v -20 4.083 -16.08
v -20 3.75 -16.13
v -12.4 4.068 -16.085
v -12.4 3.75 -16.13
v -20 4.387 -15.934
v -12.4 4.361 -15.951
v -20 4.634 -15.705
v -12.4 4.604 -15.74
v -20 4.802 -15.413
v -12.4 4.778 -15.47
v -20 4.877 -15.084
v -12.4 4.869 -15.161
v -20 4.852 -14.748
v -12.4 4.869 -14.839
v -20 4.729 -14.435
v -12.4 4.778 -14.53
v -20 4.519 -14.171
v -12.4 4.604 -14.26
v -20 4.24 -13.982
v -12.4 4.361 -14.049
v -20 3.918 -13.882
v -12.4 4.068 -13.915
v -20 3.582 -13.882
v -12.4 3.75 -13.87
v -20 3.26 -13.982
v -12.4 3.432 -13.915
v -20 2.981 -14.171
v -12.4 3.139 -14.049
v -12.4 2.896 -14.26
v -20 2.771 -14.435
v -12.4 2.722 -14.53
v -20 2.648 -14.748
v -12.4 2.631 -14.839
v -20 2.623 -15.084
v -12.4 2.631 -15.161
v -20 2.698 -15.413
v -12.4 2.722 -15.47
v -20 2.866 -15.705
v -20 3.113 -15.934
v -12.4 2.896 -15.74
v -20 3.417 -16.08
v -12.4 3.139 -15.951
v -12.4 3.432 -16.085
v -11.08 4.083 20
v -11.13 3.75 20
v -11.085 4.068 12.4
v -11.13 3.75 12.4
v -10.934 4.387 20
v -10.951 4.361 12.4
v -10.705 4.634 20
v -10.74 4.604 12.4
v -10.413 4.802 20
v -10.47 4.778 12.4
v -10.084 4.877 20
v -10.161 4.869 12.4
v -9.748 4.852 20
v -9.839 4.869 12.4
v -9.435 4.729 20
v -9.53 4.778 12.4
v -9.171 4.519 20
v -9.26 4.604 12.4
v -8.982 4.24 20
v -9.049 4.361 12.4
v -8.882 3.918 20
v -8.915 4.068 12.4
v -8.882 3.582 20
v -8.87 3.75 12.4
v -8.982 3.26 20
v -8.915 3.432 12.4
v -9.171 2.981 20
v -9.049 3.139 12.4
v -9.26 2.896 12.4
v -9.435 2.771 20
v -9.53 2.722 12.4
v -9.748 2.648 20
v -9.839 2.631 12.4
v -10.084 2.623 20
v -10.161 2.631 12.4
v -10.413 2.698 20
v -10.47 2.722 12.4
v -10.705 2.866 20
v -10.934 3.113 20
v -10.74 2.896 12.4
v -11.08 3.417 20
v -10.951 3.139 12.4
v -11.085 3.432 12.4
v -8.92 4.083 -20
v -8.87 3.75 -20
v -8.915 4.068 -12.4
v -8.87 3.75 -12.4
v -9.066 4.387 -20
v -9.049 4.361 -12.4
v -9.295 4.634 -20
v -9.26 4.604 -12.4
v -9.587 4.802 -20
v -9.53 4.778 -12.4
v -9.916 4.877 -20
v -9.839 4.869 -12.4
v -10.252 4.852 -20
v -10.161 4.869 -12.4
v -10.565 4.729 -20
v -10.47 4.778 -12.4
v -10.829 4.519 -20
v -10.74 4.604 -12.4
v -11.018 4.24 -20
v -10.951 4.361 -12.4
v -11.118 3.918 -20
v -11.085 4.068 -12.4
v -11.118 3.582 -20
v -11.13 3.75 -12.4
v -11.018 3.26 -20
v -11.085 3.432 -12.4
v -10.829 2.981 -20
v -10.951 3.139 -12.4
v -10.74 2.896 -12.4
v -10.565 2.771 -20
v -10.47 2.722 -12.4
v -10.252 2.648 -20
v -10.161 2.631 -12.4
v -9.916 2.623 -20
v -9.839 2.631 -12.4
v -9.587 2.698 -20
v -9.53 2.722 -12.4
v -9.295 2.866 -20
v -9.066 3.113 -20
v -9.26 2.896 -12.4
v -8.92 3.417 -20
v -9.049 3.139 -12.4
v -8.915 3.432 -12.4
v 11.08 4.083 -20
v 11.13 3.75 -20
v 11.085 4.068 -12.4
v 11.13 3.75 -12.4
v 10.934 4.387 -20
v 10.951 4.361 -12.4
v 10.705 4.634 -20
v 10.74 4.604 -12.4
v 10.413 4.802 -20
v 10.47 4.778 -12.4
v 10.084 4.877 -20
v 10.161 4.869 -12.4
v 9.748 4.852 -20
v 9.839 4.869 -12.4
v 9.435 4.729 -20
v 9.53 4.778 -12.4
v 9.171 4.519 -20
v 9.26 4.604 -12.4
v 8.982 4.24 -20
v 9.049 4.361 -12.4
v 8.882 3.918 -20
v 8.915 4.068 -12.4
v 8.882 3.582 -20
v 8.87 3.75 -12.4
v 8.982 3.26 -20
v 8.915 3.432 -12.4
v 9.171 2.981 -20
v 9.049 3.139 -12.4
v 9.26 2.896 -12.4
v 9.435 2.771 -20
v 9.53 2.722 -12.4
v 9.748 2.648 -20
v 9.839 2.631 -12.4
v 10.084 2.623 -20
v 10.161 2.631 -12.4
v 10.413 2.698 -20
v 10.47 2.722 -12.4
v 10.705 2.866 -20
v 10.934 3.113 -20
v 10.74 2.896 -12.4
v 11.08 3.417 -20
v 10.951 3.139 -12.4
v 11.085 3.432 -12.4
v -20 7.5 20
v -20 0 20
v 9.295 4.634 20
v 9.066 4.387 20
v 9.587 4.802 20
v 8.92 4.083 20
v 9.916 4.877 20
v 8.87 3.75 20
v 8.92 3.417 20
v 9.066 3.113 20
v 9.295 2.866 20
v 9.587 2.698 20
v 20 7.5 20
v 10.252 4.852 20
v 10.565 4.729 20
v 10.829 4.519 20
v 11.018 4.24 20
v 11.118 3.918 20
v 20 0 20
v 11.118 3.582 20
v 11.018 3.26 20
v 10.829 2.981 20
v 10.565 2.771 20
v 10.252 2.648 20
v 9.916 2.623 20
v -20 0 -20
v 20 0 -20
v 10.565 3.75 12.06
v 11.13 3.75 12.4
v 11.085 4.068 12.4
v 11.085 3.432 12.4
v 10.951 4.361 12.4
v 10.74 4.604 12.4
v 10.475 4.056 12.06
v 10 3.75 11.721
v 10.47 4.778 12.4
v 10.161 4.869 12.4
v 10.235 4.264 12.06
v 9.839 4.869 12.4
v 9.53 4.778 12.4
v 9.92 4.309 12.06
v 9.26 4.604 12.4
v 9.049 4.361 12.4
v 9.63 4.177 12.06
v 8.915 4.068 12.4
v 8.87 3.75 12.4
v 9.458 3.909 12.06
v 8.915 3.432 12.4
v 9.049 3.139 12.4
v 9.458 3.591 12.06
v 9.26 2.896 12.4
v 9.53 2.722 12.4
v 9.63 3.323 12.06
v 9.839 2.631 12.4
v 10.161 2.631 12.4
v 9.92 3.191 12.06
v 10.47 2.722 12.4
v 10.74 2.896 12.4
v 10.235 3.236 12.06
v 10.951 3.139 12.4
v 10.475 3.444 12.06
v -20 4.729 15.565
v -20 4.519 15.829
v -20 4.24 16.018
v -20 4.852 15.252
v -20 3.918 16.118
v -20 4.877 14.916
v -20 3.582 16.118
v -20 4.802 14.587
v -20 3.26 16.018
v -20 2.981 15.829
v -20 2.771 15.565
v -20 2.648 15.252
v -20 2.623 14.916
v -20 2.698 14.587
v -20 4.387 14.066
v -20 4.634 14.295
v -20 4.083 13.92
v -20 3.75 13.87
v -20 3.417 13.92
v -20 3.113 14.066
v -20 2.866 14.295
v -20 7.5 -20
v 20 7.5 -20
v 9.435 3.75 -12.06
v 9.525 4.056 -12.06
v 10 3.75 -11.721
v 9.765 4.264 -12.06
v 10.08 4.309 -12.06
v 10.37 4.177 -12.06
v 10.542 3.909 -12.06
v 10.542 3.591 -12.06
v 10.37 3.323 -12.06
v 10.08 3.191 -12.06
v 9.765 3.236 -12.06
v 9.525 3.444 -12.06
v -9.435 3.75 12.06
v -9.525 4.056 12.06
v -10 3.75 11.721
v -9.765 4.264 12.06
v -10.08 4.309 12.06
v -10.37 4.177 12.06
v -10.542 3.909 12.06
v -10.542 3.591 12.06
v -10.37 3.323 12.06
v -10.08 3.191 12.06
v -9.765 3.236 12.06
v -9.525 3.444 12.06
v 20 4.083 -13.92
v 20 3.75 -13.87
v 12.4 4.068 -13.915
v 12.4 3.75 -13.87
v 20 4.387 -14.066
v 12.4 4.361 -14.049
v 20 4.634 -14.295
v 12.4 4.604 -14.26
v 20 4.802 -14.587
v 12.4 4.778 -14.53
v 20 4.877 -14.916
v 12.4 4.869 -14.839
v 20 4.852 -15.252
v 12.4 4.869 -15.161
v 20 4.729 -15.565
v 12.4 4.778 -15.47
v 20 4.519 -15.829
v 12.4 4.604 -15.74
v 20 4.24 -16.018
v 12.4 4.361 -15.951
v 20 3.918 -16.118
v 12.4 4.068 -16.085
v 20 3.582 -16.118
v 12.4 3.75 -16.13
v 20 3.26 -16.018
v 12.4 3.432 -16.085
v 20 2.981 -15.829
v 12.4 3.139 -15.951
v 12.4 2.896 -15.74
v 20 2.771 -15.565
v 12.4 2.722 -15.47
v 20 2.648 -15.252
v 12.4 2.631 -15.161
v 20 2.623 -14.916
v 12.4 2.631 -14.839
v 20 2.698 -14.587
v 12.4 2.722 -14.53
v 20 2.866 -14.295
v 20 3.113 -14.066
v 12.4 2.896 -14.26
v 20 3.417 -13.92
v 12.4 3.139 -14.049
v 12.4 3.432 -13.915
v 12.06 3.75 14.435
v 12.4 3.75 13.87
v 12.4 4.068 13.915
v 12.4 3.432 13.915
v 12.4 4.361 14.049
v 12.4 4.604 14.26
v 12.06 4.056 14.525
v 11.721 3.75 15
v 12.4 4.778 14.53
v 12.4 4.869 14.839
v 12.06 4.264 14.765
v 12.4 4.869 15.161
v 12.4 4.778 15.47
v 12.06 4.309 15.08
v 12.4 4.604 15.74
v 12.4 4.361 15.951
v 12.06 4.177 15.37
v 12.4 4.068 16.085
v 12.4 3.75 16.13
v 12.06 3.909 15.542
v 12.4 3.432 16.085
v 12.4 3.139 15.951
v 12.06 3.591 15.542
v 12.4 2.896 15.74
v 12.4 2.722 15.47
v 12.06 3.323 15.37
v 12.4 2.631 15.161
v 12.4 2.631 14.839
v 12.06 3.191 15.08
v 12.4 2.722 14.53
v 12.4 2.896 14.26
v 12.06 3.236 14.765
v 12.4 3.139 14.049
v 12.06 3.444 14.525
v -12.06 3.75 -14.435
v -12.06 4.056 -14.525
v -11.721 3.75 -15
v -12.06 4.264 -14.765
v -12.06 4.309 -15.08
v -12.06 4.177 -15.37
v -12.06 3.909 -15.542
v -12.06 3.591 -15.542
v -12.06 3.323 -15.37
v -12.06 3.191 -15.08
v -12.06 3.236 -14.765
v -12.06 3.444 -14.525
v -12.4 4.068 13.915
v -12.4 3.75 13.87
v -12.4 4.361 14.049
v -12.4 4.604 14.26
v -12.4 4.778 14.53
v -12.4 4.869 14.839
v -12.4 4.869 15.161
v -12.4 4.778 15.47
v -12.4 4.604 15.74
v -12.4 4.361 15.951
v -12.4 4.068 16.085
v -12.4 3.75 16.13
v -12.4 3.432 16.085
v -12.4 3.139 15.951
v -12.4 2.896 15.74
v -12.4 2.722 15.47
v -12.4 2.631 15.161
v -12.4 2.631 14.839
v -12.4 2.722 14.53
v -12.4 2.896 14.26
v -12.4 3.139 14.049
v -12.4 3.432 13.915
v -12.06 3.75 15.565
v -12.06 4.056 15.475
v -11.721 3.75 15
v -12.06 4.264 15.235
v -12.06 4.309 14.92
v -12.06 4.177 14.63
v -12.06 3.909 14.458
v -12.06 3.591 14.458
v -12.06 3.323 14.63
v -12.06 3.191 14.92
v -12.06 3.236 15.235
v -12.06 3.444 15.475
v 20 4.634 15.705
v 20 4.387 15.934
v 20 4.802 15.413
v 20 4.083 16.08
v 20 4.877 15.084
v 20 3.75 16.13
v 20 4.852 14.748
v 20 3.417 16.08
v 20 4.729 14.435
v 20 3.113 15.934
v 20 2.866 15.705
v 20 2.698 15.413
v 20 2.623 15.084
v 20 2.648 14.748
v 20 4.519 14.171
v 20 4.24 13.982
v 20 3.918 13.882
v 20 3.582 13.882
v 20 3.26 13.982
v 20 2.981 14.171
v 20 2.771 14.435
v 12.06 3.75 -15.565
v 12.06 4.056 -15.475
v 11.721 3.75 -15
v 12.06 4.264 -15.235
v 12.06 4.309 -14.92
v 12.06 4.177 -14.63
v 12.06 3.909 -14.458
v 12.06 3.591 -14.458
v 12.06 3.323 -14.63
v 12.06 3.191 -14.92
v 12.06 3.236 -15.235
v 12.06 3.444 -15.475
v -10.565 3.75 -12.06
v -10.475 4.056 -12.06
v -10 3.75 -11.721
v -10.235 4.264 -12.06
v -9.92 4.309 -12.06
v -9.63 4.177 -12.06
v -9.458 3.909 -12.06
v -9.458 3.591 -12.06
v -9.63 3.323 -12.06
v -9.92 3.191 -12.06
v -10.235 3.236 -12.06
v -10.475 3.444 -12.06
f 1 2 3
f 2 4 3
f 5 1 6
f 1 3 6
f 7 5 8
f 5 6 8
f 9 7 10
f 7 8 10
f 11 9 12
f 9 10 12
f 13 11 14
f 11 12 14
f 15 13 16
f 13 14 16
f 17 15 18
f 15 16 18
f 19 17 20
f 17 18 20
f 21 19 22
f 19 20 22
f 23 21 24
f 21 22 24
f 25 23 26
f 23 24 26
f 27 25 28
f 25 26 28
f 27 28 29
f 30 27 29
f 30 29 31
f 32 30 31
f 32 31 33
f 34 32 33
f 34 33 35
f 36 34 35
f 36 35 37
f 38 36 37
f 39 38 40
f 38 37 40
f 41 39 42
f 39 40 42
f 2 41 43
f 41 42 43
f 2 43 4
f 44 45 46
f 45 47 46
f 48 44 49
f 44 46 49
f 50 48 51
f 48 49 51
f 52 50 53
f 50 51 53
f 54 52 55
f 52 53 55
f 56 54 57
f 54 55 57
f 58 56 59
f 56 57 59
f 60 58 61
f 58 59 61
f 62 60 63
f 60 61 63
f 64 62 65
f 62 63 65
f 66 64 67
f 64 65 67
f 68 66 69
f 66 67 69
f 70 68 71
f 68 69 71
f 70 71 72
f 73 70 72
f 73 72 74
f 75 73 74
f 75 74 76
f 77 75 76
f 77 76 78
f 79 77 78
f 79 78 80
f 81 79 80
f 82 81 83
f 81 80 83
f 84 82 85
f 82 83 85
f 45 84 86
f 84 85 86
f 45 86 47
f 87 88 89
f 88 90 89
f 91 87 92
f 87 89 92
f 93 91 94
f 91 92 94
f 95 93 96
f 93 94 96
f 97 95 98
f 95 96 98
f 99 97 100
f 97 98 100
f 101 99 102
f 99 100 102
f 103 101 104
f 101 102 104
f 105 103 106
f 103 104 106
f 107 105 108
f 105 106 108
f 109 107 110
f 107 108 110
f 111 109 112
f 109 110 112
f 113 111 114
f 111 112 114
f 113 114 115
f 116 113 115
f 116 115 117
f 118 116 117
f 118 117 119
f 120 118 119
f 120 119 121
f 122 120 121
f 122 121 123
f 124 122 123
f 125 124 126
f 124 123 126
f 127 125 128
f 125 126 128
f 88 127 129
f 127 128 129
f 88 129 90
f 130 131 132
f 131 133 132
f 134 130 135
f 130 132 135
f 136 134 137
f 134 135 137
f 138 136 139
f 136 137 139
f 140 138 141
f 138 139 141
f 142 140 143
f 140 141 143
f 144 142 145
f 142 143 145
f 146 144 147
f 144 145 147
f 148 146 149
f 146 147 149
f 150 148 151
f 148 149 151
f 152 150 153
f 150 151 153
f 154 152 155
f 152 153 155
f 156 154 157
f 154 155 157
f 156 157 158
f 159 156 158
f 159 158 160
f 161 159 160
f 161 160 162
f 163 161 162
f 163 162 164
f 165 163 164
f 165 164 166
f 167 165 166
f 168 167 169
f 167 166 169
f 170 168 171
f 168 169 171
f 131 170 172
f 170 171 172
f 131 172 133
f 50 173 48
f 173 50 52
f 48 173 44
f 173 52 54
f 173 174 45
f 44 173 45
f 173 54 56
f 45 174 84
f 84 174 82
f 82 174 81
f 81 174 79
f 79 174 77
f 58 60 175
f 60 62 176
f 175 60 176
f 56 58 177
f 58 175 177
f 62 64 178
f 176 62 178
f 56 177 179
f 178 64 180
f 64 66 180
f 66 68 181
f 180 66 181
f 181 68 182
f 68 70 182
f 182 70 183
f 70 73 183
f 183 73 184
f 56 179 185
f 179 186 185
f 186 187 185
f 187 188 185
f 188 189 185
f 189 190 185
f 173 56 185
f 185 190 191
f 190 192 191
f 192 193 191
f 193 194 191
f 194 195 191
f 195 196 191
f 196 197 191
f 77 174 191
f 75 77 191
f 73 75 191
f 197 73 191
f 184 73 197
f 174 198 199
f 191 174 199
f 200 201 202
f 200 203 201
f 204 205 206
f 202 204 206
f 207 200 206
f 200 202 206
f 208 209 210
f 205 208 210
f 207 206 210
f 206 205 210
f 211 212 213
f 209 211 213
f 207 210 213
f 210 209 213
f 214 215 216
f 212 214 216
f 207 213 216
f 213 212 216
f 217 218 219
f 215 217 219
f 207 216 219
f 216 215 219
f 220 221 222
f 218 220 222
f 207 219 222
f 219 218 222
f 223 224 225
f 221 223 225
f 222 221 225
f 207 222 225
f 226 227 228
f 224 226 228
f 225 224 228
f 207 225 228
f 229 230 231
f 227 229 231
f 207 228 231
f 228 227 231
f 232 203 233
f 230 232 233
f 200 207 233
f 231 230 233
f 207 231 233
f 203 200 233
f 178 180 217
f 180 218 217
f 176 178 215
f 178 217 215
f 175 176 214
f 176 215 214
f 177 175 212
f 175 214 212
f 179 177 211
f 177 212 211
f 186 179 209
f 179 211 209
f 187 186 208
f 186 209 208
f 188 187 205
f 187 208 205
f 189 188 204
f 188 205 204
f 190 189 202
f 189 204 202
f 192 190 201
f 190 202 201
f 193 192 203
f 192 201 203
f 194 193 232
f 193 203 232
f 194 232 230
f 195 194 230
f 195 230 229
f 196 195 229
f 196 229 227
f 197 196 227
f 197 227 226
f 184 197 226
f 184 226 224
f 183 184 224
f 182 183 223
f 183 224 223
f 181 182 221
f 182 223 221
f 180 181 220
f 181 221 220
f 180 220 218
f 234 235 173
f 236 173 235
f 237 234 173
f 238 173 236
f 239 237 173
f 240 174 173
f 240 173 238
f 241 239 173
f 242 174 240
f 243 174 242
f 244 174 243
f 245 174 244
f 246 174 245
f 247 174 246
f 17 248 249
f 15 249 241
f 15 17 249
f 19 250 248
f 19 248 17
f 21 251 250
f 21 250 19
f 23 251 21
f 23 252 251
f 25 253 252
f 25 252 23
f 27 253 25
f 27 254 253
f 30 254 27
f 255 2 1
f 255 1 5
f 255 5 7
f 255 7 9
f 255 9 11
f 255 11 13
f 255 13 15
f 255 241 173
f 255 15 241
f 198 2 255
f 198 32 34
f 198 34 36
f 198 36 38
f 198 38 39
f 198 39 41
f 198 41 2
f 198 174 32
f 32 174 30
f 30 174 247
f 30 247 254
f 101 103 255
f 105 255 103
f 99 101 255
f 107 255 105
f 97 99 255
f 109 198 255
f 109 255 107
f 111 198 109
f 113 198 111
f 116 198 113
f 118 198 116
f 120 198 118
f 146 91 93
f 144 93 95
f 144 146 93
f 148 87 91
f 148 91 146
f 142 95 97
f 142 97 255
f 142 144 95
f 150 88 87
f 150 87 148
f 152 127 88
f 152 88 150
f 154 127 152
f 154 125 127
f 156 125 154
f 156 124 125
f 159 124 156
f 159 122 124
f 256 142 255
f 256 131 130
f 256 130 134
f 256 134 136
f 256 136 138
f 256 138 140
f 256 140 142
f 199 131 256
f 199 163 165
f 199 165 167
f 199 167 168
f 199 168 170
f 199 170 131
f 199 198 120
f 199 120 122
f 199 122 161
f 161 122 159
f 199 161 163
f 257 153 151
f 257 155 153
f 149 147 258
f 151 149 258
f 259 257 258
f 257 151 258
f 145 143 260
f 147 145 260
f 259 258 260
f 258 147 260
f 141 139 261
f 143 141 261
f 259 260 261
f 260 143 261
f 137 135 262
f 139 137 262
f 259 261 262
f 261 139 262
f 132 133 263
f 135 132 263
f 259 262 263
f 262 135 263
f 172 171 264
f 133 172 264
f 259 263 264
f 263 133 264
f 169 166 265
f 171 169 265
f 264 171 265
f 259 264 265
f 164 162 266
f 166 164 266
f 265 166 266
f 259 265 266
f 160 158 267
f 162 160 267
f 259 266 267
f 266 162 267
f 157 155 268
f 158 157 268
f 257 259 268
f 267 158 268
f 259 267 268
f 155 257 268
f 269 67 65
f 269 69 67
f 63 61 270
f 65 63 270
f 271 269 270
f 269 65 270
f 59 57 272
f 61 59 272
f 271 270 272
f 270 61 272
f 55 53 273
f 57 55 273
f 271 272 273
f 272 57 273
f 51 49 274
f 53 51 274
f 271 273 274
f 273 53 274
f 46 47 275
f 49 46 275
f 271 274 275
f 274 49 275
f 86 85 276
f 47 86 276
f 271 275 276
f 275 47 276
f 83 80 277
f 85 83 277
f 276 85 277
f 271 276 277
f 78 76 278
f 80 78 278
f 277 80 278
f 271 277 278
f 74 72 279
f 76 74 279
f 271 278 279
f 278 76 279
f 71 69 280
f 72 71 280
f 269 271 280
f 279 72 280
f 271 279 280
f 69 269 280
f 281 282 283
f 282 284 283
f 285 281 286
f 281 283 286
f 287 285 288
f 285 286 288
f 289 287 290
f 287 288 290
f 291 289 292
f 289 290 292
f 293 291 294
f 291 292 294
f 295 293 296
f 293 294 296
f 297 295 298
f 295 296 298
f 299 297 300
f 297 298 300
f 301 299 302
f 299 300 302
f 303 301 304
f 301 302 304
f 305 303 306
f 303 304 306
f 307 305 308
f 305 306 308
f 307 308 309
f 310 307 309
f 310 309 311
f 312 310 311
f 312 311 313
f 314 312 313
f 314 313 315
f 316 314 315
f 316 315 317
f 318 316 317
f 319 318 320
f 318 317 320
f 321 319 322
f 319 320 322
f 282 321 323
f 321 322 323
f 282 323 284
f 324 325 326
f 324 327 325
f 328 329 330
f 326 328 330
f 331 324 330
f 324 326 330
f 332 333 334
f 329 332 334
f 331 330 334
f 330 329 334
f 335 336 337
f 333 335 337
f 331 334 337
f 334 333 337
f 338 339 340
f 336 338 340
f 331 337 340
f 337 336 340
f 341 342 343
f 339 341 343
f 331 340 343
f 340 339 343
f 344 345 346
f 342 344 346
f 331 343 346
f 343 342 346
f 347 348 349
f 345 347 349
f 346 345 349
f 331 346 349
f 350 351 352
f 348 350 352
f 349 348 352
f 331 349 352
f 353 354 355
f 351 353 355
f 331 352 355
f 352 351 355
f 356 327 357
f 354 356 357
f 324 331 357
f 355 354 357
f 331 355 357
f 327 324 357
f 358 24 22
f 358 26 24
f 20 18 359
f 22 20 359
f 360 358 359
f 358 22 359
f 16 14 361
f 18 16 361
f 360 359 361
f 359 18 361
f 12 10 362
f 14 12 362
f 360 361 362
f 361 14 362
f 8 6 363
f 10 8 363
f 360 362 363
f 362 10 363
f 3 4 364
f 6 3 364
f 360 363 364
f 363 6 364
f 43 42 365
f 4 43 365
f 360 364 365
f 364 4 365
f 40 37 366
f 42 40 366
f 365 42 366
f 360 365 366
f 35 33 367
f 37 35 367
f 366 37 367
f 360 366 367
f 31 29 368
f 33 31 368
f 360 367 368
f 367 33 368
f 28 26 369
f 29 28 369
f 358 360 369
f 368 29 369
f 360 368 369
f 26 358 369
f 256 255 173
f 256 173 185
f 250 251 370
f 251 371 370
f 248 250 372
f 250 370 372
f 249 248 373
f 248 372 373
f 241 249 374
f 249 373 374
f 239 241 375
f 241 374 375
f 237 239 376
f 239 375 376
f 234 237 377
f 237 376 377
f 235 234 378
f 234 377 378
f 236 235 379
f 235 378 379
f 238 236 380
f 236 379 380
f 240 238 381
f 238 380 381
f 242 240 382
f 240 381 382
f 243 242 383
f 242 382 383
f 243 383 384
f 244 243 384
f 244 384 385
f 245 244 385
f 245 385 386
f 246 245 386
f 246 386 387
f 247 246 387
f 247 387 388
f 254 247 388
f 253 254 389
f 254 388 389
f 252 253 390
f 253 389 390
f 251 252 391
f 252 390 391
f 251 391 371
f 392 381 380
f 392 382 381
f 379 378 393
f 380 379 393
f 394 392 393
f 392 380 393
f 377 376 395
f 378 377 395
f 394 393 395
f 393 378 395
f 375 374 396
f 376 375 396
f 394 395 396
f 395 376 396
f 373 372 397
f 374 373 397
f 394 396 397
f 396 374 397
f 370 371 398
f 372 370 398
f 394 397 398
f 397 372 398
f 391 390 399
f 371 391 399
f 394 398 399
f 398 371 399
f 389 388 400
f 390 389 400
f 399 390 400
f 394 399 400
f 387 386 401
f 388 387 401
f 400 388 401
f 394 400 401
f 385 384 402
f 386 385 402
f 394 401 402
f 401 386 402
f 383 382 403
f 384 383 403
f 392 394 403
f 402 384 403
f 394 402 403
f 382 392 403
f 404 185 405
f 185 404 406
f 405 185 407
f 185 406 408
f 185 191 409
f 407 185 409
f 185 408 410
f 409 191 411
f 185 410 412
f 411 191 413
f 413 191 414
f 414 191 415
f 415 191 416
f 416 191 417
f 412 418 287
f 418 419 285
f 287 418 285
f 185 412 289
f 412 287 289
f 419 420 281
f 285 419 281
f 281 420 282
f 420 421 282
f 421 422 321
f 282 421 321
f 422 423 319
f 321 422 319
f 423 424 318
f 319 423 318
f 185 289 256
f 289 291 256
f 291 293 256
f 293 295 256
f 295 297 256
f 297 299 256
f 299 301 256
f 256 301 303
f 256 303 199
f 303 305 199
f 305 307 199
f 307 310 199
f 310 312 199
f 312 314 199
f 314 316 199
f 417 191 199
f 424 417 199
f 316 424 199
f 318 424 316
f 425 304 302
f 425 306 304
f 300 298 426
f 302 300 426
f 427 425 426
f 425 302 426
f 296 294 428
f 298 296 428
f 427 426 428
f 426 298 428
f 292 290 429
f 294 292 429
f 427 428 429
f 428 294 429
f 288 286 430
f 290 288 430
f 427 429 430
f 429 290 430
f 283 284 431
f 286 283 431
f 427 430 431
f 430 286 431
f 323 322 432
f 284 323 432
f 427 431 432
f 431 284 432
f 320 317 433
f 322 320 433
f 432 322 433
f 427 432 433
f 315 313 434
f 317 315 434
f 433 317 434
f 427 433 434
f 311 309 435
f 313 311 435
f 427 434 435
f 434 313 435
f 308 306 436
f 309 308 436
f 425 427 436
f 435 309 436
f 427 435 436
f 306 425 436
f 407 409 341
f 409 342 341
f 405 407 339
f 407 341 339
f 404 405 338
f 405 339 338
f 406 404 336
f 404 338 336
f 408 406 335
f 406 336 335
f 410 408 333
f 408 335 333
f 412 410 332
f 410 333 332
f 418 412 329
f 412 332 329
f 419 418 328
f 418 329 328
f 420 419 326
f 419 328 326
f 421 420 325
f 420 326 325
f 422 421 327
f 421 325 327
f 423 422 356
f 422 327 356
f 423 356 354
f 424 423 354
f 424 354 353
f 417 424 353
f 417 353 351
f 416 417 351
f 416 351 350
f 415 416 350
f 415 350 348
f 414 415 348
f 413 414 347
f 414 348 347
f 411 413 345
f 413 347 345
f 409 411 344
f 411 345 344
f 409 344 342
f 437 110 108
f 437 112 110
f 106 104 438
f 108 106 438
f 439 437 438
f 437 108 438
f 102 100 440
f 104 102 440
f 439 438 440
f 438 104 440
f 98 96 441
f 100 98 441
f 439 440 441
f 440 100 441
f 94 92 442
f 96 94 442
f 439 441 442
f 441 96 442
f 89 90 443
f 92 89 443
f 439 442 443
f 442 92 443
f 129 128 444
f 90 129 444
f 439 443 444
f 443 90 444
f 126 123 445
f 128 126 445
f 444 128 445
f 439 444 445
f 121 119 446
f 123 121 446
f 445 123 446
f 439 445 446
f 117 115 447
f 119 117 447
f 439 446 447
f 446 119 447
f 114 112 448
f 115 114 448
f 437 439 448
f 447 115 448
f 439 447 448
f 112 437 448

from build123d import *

# Parameters (mm, degrees)
SKETCH1_W                 = 40
SKETCH1_H                 = 40
BOSS_EXTRUDE1_DEPTH       = 7.5
F_4_40_TAPPED_HOLE1_D     = 2.2606
F_4_40_TAPPED_HOLE1_DEPTH = 7.6
F_4_40_TAPPED_HOLE1_TIP   = 0.679152758
F_4_40_TAPPED_HOLE2_D     = 2.2606
F_4_40_TAPPED_HOLE2_DEPTH = 7.6
F_4_40_TAPPED_HOLE2_TIP   = 0.679152758
F_4_40_TAPPED_HOLE3_D     = 2.2606
F_4_40_TAPPED_HOLE3_DEPTH = 7.6
F_4_40_TAPPED_HOLE3_TIP   = 0.679152758
F_4_40_TAPPED_HOLE4_D     = 2.2606
F_4_40_TAPPED_HOLE4_DEPTH = 7.6
F_4_40_TAPPED_HOLE4_TIP   = 0.679152758


with BuildPart() as part:
    # Sketch1 → Boss-Extrude1 (new body)
    with BuildSketch(Plane(origin=(0, 0, 0), x_dir=(1, 0, 0), z_dir=(0, 1, 0))):
        Rectangle(SKETCH1_W, SKETCH1_H)
    extrude(amount=BOSS_EXTRUDE1_DEPTH)

    # #4-40 Tapped Hole1
    with Locations(Plane.ZY.offset(20)):
        with Locations((-15, 3.75), (15, 3.75)):
            Hole(F_4_40_TAPPED_HOLE1_D / 2, depth=F_4_40_TAPPED_HOLE1_DEPTH)
            with Locations((0, 0, -(F_4_40_TAPPED_HOLE1_DEPTH + F_4_40_TAPPED_HOLE1_TIP / 2))):  # 118° drill point
                Cone(0, F_4_40_TAPPED_HOLE1_D / 2, F_4_40_TAPPED_HOLE1_TIP, mode=Mode.SUBTRACT)

    # #4-40 Tapped Hole2
    with Locations(Plane(origin=(20, 0, 0), x_dir=(0, 0, -1), z_dir=(1, 0, 0))):
        with Locations((-15, 3.75), (15, 3.75)):
            Hole(F_4_40_TAPPED_HOLE2_D / 2, depth=F_4_40_TAPPED_HOLE2_DEPTH)
            with Locations((0, 0, -(F_4_40_TAPPED_HOLE2_DEPTH + F_4_40_TAPPED_HOLE2_TIP / 2))):  # 118° drill point
                Cone(0, F_4_40_TAPPED_HOLE2_D / 2, F_4_40_TAPPED_HOLE2_TIP, mode=Mode.SUBTRACT)

    # #4-40 Tapped Hole3
    with Locations(Plane(origin=(0, 0, -20), x_dir=(-1, 0, 0), z_dir=(0, 0, -1))):
        with Locations((-10, 3.75), (10, 3.75)):
            Hole(F_4_40_TAPPED_HOLE3_D / 2, depth=F_4_40_TAPPED_HOLE3_DEPTH)
            with Locations((0, 0, -(F_4_40_TAPPED_HOLE3_DEPTH + F_4_40_TAPPED_HOLE3_TIP / 2))):  # 118° drill point
                Cone(0, F_4_40_TAPPED_HOLE3_D / 2, F_4_40_TAPPED_HOLE3_TIP, mode=Mode.SUBTRACT)

    # #4-40 Tapped Hole4
    with Locations(Plane.XY.offset(20)):
        with Locations((-10, 3.75), (10, 3.75)):
            Hole(F_4_40_TAPPED_HOLE4_D / 2, depth=F_4_40_TAPPED_HOLE4_DEPTH)
            with Locations((0, 0, -(F_4_40_TAPPED_HOLE4_DEPTH + F_4_40_TAPPED_HOLE4_TIP / 2))):  # 118° drill point
                Cone(0, F_4_40_TAPPED_HOLE4_D / 2, F_4_40_TAPPED_HOLE4_TIP, mode=Mode.SUBTRACT)


solid = part.part
